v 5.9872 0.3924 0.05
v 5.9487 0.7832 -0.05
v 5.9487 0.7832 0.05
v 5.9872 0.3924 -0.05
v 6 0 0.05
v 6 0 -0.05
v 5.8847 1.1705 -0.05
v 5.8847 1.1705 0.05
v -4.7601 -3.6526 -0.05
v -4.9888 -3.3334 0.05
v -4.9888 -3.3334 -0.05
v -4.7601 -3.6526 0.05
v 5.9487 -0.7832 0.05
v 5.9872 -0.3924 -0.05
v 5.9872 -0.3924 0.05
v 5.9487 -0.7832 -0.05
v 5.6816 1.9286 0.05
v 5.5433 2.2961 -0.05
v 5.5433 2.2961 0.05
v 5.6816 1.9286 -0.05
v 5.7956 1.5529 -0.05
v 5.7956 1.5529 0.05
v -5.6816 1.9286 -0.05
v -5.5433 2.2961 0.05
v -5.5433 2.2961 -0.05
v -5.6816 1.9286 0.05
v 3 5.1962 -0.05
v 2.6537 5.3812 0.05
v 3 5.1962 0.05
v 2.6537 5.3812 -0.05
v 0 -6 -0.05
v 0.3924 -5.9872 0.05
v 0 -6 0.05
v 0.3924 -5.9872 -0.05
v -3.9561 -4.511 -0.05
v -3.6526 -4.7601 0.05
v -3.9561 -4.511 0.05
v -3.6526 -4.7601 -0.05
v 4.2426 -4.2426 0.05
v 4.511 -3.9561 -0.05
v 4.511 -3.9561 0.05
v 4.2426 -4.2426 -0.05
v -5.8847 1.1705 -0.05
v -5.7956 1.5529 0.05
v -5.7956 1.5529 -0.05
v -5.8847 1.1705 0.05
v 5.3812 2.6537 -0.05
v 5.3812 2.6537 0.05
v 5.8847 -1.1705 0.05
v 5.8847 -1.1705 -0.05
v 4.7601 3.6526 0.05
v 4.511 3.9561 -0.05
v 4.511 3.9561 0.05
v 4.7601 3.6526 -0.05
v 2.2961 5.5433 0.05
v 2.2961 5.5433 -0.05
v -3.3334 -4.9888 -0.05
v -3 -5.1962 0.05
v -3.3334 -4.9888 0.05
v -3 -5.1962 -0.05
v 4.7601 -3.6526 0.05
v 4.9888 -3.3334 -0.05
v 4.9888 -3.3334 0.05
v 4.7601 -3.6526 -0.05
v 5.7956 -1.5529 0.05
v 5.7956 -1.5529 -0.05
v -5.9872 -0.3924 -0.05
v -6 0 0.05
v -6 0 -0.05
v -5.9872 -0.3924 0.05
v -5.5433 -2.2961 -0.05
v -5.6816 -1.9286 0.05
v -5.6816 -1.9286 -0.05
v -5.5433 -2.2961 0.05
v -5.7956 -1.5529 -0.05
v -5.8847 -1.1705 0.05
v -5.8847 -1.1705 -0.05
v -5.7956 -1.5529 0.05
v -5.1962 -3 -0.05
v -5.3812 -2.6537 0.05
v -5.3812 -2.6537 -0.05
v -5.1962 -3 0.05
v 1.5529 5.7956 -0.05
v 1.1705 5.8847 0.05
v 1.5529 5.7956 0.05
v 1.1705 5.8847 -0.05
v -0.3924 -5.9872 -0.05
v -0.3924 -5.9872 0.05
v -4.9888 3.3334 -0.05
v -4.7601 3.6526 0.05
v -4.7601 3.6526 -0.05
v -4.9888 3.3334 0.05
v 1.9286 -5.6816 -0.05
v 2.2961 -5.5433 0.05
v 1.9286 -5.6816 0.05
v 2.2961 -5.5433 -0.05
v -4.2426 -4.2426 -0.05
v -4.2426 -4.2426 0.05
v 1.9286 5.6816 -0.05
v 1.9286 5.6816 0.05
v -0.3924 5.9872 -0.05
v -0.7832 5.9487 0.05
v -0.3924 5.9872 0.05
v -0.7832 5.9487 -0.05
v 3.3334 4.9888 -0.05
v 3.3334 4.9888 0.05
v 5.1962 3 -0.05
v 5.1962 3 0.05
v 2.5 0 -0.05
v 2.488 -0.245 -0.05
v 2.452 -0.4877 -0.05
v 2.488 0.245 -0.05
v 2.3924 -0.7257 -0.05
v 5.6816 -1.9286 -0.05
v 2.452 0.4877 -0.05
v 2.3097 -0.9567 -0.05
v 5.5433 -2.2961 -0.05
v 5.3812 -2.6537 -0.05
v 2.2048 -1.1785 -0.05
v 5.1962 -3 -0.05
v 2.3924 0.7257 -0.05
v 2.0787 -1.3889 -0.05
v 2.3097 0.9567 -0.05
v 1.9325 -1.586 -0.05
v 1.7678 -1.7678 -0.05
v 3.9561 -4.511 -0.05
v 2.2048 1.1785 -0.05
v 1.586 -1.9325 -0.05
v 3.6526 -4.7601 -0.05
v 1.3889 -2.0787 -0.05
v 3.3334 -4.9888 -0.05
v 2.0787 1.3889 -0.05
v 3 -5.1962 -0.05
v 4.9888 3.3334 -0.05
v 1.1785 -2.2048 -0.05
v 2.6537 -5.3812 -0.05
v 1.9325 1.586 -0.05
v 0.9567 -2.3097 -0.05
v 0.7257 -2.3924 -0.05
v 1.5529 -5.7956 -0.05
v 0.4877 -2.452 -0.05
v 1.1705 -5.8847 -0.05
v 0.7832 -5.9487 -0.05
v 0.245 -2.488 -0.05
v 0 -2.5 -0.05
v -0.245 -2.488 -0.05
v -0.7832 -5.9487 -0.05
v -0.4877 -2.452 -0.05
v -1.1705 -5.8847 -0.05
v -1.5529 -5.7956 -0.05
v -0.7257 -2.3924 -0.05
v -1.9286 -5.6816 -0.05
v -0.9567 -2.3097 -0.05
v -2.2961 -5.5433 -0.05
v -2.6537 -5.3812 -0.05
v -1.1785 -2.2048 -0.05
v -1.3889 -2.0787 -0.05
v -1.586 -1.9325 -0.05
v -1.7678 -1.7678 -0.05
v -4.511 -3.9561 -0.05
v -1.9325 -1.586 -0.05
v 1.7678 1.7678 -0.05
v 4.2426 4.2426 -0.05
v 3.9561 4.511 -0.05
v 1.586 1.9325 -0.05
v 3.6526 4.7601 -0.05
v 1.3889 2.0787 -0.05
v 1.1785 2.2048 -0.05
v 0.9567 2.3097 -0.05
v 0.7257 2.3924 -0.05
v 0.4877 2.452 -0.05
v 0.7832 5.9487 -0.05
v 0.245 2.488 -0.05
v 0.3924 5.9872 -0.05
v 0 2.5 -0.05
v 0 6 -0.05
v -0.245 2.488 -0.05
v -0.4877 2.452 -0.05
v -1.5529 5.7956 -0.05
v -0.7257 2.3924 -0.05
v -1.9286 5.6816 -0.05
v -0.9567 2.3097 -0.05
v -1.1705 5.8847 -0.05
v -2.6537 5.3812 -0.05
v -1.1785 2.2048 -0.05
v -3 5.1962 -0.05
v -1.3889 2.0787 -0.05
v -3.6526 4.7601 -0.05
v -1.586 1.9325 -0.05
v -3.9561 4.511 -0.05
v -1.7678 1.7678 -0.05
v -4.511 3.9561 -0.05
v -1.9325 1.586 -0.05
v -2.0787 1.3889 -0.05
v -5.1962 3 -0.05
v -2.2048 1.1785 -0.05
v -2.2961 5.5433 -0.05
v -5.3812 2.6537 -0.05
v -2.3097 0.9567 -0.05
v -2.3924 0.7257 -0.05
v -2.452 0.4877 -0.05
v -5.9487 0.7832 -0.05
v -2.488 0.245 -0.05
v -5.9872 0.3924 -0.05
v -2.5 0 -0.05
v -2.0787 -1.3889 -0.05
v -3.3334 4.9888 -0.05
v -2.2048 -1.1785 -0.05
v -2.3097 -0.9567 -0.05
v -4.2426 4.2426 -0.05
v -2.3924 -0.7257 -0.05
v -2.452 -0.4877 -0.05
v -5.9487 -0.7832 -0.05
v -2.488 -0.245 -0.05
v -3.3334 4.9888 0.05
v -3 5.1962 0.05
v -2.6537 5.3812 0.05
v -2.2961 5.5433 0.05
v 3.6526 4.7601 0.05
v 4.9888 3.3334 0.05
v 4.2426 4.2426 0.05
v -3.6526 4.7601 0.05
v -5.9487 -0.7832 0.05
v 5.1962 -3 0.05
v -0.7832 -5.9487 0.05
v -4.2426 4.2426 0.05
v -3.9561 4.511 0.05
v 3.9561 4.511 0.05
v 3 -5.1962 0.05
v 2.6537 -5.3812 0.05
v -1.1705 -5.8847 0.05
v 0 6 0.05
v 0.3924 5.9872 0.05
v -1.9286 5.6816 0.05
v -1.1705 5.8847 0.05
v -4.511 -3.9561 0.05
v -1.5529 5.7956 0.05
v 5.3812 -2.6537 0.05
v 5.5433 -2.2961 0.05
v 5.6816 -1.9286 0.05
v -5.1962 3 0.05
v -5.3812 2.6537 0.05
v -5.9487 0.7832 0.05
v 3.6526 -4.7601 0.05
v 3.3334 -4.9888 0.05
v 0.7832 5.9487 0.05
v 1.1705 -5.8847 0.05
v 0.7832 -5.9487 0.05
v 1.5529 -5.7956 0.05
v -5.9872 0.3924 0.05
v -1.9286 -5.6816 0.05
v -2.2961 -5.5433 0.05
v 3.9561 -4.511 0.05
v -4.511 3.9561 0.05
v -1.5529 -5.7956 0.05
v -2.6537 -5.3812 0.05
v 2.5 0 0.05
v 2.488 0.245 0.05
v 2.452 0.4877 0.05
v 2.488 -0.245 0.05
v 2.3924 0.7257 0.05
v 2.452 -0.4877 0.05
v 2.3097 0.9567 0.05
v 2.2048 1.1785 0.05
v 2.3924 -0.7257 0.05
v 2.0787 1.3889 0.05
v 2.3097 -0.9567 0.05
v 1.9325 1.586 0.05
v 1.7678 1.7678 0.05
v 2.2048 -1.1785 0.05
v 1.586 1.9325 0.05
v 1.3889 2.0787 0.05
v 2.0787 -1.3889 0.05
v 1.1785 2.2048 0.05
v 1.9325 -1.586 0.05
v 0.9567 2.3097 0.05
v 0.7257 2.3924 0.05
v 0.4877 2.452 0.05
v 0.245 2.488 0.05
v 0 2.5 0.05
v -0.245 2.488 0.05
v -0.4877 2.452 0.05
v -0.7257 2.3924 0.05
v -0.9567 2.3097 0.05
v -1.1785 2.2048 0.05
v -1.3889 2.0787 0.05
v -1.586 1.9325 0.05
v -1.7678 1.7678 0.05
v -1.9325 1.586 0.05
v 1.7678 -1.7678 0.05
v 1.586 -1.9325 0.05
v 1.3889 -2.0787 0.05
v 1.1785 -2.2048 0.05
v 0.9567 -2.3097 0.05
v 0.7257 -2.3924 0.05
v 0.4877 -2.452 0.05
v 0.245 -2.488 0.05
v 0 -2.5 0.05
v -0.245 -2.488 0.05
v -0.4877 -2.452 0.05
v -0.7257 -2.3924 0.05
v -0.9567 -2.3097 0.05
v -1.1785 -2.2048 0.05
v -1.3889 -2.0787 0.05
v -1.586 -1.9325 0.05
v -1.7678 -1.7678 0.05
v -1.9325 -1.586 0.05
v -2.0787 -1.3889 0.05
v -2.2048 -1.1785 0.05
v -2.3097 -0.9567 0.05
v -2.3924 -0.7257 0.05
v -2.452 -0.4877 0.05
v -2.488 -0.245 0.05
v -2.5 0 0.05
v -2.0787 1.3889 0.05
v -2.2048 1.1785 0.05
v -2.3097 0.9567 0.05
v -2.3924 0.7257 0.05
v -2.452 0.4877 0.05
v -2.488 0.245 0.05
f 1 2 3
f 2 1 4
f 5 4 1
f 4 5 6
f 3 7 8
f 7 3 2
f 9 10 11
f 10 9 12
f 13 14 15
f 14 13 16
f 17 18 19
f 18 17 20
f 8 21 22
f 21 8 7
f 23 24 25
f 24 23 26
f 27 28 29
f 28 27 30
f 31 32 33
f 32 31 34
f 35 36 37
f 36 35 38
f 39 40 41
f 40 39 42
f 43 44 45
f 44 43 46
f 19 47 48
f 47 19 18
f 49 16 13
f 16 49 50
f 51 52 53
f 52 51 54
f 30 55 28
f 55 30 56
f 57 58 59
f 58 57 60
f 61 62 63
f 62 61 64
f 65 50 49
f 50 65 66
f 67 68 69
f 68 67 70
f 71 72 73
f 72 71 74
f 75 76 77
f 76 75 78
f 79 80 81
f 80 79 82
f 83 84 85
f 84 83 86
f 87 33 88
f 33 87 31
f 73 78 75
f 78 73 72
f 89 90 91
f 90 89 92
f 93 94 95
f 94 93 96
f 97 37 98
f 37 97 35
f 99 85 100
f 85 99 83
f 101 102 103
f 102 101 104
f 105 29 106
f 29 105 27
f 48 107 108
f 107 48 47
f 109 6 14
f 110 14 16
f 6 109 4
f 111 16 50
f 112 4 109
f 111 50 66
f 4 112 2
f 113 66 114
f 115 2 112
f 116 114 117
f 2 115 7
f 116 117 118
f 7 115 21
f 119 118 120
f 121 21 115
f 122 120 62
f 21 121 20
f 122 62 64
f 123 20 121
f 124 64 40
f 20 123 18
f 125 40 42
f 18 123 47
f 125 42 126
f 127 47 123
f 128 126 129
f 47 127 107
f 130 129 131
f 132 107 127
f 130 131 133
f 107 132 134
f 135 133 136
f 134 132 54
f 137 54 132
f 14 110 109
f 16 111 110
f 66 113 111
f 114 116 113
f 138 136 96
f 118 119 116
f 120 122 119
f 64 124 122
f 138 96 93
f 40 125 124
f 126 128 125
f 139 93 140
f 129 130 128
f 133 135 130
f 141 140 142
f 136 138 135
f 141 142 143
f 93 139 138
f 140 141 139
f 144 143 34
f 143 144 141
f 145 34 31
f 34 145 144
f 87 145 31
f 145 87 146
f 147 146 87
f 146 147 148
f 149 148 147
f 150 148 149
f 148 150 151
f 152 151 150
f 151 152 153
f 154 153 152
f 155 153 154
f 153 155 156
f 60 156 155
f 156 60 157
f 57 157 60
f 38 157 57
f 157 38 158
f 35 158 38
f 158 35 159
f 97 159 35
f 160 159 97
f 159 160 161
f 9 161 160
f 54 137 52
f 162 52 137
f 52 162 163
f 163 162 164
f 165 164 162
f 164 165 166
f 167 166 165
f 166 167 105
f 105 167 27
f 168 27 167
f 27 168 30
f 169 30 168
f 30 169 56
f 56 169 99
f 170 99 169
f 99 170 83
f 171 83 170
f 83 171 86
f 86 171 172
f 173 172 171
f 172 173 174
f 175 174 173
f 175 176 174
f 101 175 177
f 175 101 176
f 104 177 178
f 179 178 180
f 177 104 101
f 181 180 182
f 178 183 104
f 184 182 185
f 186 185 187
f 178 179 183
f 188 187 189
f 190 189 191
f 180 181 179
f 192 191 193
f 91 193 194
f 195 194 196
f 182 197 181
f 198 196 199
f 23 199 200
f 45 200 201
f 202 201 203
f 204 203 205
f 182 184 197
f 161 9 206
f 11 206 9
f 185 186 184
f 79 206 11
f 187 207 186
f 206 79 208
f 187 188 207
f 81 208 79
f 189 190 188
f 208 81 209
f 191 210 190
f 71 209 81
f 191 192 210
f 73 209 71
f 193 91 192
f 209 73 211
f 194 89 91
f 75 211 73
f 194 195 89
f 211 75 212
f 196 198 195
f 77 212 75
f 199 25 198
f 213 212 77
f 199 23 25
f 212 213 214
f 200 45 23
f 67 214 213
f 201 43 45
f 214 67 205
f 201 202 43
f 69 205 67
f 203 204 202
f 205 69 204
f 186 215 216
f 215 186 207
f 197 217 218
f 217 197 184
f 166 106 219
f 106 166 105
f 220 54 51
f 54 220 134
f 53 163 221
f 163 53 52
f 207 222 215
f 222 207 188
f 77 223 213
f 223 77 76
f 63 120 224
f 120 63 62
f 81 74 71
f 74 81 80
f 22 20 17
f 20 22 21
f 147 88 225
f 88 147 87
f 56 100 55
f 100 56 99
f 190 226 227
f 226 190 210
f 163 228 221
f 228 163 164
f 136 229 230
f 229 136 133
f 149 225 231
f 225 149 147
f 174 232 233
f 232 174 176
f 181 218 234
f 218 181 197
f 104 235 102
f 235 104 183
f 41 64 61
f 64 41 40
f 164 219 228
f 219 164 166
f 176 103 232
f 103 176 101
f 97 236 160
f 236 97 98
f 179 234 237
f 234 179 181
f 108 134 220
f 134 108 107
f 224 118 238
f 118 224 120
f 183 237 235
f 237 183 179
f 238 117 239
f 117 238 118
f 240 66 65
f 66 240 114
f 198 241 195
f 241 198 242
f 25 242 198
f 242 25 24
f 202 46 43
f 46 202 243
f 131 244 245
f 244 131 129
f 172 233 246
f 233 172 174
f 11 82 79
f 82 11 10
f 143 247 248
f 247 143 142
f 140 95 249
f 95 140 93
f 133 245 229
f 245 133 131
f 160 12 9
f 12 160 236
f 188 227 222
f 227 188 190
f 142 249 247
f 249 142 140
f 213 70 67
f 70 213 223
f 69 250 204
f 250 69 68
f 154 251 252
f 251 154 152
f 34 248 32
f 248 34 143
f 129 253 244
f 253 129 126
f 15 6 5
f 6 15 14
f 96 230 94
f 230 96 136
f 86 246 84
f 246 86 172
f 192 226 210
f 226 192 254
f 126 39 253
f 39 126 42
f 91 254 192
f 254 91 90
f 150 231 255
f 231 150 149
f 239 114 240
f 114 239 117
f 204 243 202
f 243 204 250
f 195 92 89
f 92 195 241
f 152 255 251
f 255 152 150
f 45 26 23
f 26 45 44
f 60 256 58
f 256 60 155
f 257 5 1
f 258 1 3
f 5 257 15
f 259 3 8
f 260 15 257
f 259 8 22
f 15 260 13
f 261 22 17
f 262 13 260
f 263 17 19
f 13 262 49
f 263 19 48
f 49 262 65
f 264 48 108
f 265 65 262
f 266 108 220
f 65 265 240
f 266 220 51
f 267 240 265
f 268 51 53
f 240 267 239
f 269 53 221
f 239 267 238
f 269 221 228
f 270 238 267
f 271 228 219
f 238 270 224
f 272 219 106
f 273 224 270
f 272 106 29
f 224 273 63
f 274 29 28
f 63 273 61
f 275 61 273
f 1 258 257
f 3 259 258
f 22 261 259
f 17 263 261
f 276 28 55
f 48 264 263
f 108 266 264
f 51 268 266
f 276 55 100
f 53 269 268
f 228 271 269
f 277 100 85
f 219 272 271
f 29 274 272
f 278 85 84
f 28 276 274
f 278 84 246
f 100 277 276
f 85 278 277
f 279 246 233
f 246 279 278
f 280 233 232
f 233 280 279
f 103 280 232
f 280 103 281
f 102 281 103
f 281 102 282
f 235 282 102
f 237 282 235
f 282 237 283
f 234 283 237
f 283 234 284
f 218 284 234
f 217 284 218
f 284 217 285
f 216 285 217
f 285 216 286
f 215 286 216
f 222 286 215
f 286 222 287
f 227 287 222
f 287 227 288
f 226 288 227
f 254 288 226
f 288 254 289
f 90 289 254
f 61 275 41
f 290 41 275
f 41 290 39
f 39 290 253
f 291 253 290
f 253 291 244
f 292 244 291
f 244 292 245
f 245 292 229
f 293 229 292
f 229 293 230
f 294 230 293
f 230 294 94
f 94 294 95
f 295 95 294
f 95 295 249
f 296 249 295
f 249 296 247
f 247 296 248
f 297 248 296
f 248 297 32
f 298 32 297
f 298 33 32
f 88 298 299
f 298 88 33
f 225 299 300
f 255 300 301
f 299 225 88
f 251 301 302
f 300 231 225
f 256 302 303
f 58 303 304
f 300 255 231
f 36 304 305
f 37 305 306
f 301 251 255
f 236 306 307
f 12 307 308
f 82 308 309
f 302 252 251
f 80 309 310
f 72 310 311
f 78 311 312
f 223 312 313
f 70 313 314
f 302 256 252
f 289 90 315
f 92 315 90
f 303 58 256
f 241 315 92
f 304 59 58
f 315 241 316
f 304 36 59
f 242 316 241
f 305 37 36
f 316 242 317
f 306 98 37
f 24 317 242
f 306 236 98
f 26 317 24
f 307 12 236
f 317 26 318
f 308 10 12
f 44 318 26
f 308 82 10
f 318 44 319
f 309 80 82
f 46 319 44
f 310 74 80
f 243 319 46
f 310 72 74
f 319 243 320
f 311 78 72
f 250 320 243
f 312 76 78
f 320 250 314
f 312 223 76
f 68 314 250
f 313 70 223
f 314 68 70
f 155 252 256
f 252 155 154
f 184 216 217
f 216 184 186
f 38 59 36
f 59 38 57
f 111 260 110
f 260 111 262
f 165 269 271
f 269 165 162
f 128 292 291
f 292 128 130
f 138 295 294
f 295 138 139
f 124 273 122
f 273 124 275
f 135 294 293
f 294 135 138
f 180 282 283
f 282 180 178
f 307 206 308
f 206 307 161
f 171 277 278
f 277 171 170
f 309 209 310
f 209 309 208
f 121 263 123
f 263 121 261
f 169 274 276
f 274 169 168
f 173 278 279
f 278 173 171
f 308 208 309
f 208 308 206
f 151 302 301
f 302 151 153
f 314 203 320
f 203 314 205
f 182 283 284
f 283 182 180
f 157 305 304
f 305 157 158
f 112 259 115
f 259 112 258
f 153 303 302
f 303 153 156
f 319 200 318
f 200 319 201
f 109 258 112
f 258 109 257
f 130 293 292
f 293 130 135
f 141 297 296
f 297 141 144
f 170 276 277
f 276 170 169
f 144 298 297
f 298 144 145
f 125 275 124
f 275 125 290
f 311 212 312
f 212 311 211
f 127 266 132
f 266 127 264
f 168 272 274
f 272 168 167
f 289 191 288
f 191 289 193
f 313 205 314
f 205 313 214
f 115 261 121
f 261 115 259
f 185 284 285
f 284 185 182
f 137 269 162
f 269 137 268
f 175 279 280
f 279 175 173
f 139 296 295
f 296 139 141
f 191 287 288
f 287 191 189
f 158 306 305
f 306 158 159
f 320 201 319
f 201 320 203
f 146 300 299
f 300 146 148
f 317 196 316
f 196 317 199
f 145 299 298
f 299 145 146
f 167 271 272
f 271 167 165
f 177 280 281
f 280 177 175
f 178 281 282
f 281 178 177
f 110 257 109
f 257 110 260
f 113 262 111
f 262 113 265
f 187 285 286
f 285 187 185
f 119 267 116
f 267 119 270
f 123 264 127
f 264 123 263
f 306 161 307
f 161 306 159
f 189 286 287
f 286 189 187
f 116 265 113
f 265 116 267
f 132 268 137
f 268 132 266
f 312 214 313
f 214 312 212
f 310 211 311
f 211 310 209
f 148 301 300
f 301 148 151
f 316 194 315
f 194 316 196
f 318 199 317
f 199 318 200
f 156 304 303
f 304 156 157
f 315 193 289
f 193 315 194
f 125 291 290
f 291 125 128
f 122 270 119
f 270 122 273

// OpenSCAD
// part_id: d4
// name: D4 washer
// source_drawing_ids: DRW-004
// units: mm
// SPDX-License-Identifier: MIT
//
// Part D4: simple thin washer shown on DRW-004 sheet 13.
//
// Local origin convention:
// - XY origin is the washer axis.
// - Z origin is the part midplane.

module part_d4(
    outer_d = 12.0,
    inner_d = 5.0,
    thickness = 0.1
) {
    difference() {
        cylinder(d = outer_d, h = thickness, center = true, $fn = 96);
        cylinder(d = inner_d, h = thickness + 0.2, center = true, $fn = 64);
    }
}

// ---- "main guard" ----
if (is_undef(__LIB_MODE__)) {
    part_d4();
}
